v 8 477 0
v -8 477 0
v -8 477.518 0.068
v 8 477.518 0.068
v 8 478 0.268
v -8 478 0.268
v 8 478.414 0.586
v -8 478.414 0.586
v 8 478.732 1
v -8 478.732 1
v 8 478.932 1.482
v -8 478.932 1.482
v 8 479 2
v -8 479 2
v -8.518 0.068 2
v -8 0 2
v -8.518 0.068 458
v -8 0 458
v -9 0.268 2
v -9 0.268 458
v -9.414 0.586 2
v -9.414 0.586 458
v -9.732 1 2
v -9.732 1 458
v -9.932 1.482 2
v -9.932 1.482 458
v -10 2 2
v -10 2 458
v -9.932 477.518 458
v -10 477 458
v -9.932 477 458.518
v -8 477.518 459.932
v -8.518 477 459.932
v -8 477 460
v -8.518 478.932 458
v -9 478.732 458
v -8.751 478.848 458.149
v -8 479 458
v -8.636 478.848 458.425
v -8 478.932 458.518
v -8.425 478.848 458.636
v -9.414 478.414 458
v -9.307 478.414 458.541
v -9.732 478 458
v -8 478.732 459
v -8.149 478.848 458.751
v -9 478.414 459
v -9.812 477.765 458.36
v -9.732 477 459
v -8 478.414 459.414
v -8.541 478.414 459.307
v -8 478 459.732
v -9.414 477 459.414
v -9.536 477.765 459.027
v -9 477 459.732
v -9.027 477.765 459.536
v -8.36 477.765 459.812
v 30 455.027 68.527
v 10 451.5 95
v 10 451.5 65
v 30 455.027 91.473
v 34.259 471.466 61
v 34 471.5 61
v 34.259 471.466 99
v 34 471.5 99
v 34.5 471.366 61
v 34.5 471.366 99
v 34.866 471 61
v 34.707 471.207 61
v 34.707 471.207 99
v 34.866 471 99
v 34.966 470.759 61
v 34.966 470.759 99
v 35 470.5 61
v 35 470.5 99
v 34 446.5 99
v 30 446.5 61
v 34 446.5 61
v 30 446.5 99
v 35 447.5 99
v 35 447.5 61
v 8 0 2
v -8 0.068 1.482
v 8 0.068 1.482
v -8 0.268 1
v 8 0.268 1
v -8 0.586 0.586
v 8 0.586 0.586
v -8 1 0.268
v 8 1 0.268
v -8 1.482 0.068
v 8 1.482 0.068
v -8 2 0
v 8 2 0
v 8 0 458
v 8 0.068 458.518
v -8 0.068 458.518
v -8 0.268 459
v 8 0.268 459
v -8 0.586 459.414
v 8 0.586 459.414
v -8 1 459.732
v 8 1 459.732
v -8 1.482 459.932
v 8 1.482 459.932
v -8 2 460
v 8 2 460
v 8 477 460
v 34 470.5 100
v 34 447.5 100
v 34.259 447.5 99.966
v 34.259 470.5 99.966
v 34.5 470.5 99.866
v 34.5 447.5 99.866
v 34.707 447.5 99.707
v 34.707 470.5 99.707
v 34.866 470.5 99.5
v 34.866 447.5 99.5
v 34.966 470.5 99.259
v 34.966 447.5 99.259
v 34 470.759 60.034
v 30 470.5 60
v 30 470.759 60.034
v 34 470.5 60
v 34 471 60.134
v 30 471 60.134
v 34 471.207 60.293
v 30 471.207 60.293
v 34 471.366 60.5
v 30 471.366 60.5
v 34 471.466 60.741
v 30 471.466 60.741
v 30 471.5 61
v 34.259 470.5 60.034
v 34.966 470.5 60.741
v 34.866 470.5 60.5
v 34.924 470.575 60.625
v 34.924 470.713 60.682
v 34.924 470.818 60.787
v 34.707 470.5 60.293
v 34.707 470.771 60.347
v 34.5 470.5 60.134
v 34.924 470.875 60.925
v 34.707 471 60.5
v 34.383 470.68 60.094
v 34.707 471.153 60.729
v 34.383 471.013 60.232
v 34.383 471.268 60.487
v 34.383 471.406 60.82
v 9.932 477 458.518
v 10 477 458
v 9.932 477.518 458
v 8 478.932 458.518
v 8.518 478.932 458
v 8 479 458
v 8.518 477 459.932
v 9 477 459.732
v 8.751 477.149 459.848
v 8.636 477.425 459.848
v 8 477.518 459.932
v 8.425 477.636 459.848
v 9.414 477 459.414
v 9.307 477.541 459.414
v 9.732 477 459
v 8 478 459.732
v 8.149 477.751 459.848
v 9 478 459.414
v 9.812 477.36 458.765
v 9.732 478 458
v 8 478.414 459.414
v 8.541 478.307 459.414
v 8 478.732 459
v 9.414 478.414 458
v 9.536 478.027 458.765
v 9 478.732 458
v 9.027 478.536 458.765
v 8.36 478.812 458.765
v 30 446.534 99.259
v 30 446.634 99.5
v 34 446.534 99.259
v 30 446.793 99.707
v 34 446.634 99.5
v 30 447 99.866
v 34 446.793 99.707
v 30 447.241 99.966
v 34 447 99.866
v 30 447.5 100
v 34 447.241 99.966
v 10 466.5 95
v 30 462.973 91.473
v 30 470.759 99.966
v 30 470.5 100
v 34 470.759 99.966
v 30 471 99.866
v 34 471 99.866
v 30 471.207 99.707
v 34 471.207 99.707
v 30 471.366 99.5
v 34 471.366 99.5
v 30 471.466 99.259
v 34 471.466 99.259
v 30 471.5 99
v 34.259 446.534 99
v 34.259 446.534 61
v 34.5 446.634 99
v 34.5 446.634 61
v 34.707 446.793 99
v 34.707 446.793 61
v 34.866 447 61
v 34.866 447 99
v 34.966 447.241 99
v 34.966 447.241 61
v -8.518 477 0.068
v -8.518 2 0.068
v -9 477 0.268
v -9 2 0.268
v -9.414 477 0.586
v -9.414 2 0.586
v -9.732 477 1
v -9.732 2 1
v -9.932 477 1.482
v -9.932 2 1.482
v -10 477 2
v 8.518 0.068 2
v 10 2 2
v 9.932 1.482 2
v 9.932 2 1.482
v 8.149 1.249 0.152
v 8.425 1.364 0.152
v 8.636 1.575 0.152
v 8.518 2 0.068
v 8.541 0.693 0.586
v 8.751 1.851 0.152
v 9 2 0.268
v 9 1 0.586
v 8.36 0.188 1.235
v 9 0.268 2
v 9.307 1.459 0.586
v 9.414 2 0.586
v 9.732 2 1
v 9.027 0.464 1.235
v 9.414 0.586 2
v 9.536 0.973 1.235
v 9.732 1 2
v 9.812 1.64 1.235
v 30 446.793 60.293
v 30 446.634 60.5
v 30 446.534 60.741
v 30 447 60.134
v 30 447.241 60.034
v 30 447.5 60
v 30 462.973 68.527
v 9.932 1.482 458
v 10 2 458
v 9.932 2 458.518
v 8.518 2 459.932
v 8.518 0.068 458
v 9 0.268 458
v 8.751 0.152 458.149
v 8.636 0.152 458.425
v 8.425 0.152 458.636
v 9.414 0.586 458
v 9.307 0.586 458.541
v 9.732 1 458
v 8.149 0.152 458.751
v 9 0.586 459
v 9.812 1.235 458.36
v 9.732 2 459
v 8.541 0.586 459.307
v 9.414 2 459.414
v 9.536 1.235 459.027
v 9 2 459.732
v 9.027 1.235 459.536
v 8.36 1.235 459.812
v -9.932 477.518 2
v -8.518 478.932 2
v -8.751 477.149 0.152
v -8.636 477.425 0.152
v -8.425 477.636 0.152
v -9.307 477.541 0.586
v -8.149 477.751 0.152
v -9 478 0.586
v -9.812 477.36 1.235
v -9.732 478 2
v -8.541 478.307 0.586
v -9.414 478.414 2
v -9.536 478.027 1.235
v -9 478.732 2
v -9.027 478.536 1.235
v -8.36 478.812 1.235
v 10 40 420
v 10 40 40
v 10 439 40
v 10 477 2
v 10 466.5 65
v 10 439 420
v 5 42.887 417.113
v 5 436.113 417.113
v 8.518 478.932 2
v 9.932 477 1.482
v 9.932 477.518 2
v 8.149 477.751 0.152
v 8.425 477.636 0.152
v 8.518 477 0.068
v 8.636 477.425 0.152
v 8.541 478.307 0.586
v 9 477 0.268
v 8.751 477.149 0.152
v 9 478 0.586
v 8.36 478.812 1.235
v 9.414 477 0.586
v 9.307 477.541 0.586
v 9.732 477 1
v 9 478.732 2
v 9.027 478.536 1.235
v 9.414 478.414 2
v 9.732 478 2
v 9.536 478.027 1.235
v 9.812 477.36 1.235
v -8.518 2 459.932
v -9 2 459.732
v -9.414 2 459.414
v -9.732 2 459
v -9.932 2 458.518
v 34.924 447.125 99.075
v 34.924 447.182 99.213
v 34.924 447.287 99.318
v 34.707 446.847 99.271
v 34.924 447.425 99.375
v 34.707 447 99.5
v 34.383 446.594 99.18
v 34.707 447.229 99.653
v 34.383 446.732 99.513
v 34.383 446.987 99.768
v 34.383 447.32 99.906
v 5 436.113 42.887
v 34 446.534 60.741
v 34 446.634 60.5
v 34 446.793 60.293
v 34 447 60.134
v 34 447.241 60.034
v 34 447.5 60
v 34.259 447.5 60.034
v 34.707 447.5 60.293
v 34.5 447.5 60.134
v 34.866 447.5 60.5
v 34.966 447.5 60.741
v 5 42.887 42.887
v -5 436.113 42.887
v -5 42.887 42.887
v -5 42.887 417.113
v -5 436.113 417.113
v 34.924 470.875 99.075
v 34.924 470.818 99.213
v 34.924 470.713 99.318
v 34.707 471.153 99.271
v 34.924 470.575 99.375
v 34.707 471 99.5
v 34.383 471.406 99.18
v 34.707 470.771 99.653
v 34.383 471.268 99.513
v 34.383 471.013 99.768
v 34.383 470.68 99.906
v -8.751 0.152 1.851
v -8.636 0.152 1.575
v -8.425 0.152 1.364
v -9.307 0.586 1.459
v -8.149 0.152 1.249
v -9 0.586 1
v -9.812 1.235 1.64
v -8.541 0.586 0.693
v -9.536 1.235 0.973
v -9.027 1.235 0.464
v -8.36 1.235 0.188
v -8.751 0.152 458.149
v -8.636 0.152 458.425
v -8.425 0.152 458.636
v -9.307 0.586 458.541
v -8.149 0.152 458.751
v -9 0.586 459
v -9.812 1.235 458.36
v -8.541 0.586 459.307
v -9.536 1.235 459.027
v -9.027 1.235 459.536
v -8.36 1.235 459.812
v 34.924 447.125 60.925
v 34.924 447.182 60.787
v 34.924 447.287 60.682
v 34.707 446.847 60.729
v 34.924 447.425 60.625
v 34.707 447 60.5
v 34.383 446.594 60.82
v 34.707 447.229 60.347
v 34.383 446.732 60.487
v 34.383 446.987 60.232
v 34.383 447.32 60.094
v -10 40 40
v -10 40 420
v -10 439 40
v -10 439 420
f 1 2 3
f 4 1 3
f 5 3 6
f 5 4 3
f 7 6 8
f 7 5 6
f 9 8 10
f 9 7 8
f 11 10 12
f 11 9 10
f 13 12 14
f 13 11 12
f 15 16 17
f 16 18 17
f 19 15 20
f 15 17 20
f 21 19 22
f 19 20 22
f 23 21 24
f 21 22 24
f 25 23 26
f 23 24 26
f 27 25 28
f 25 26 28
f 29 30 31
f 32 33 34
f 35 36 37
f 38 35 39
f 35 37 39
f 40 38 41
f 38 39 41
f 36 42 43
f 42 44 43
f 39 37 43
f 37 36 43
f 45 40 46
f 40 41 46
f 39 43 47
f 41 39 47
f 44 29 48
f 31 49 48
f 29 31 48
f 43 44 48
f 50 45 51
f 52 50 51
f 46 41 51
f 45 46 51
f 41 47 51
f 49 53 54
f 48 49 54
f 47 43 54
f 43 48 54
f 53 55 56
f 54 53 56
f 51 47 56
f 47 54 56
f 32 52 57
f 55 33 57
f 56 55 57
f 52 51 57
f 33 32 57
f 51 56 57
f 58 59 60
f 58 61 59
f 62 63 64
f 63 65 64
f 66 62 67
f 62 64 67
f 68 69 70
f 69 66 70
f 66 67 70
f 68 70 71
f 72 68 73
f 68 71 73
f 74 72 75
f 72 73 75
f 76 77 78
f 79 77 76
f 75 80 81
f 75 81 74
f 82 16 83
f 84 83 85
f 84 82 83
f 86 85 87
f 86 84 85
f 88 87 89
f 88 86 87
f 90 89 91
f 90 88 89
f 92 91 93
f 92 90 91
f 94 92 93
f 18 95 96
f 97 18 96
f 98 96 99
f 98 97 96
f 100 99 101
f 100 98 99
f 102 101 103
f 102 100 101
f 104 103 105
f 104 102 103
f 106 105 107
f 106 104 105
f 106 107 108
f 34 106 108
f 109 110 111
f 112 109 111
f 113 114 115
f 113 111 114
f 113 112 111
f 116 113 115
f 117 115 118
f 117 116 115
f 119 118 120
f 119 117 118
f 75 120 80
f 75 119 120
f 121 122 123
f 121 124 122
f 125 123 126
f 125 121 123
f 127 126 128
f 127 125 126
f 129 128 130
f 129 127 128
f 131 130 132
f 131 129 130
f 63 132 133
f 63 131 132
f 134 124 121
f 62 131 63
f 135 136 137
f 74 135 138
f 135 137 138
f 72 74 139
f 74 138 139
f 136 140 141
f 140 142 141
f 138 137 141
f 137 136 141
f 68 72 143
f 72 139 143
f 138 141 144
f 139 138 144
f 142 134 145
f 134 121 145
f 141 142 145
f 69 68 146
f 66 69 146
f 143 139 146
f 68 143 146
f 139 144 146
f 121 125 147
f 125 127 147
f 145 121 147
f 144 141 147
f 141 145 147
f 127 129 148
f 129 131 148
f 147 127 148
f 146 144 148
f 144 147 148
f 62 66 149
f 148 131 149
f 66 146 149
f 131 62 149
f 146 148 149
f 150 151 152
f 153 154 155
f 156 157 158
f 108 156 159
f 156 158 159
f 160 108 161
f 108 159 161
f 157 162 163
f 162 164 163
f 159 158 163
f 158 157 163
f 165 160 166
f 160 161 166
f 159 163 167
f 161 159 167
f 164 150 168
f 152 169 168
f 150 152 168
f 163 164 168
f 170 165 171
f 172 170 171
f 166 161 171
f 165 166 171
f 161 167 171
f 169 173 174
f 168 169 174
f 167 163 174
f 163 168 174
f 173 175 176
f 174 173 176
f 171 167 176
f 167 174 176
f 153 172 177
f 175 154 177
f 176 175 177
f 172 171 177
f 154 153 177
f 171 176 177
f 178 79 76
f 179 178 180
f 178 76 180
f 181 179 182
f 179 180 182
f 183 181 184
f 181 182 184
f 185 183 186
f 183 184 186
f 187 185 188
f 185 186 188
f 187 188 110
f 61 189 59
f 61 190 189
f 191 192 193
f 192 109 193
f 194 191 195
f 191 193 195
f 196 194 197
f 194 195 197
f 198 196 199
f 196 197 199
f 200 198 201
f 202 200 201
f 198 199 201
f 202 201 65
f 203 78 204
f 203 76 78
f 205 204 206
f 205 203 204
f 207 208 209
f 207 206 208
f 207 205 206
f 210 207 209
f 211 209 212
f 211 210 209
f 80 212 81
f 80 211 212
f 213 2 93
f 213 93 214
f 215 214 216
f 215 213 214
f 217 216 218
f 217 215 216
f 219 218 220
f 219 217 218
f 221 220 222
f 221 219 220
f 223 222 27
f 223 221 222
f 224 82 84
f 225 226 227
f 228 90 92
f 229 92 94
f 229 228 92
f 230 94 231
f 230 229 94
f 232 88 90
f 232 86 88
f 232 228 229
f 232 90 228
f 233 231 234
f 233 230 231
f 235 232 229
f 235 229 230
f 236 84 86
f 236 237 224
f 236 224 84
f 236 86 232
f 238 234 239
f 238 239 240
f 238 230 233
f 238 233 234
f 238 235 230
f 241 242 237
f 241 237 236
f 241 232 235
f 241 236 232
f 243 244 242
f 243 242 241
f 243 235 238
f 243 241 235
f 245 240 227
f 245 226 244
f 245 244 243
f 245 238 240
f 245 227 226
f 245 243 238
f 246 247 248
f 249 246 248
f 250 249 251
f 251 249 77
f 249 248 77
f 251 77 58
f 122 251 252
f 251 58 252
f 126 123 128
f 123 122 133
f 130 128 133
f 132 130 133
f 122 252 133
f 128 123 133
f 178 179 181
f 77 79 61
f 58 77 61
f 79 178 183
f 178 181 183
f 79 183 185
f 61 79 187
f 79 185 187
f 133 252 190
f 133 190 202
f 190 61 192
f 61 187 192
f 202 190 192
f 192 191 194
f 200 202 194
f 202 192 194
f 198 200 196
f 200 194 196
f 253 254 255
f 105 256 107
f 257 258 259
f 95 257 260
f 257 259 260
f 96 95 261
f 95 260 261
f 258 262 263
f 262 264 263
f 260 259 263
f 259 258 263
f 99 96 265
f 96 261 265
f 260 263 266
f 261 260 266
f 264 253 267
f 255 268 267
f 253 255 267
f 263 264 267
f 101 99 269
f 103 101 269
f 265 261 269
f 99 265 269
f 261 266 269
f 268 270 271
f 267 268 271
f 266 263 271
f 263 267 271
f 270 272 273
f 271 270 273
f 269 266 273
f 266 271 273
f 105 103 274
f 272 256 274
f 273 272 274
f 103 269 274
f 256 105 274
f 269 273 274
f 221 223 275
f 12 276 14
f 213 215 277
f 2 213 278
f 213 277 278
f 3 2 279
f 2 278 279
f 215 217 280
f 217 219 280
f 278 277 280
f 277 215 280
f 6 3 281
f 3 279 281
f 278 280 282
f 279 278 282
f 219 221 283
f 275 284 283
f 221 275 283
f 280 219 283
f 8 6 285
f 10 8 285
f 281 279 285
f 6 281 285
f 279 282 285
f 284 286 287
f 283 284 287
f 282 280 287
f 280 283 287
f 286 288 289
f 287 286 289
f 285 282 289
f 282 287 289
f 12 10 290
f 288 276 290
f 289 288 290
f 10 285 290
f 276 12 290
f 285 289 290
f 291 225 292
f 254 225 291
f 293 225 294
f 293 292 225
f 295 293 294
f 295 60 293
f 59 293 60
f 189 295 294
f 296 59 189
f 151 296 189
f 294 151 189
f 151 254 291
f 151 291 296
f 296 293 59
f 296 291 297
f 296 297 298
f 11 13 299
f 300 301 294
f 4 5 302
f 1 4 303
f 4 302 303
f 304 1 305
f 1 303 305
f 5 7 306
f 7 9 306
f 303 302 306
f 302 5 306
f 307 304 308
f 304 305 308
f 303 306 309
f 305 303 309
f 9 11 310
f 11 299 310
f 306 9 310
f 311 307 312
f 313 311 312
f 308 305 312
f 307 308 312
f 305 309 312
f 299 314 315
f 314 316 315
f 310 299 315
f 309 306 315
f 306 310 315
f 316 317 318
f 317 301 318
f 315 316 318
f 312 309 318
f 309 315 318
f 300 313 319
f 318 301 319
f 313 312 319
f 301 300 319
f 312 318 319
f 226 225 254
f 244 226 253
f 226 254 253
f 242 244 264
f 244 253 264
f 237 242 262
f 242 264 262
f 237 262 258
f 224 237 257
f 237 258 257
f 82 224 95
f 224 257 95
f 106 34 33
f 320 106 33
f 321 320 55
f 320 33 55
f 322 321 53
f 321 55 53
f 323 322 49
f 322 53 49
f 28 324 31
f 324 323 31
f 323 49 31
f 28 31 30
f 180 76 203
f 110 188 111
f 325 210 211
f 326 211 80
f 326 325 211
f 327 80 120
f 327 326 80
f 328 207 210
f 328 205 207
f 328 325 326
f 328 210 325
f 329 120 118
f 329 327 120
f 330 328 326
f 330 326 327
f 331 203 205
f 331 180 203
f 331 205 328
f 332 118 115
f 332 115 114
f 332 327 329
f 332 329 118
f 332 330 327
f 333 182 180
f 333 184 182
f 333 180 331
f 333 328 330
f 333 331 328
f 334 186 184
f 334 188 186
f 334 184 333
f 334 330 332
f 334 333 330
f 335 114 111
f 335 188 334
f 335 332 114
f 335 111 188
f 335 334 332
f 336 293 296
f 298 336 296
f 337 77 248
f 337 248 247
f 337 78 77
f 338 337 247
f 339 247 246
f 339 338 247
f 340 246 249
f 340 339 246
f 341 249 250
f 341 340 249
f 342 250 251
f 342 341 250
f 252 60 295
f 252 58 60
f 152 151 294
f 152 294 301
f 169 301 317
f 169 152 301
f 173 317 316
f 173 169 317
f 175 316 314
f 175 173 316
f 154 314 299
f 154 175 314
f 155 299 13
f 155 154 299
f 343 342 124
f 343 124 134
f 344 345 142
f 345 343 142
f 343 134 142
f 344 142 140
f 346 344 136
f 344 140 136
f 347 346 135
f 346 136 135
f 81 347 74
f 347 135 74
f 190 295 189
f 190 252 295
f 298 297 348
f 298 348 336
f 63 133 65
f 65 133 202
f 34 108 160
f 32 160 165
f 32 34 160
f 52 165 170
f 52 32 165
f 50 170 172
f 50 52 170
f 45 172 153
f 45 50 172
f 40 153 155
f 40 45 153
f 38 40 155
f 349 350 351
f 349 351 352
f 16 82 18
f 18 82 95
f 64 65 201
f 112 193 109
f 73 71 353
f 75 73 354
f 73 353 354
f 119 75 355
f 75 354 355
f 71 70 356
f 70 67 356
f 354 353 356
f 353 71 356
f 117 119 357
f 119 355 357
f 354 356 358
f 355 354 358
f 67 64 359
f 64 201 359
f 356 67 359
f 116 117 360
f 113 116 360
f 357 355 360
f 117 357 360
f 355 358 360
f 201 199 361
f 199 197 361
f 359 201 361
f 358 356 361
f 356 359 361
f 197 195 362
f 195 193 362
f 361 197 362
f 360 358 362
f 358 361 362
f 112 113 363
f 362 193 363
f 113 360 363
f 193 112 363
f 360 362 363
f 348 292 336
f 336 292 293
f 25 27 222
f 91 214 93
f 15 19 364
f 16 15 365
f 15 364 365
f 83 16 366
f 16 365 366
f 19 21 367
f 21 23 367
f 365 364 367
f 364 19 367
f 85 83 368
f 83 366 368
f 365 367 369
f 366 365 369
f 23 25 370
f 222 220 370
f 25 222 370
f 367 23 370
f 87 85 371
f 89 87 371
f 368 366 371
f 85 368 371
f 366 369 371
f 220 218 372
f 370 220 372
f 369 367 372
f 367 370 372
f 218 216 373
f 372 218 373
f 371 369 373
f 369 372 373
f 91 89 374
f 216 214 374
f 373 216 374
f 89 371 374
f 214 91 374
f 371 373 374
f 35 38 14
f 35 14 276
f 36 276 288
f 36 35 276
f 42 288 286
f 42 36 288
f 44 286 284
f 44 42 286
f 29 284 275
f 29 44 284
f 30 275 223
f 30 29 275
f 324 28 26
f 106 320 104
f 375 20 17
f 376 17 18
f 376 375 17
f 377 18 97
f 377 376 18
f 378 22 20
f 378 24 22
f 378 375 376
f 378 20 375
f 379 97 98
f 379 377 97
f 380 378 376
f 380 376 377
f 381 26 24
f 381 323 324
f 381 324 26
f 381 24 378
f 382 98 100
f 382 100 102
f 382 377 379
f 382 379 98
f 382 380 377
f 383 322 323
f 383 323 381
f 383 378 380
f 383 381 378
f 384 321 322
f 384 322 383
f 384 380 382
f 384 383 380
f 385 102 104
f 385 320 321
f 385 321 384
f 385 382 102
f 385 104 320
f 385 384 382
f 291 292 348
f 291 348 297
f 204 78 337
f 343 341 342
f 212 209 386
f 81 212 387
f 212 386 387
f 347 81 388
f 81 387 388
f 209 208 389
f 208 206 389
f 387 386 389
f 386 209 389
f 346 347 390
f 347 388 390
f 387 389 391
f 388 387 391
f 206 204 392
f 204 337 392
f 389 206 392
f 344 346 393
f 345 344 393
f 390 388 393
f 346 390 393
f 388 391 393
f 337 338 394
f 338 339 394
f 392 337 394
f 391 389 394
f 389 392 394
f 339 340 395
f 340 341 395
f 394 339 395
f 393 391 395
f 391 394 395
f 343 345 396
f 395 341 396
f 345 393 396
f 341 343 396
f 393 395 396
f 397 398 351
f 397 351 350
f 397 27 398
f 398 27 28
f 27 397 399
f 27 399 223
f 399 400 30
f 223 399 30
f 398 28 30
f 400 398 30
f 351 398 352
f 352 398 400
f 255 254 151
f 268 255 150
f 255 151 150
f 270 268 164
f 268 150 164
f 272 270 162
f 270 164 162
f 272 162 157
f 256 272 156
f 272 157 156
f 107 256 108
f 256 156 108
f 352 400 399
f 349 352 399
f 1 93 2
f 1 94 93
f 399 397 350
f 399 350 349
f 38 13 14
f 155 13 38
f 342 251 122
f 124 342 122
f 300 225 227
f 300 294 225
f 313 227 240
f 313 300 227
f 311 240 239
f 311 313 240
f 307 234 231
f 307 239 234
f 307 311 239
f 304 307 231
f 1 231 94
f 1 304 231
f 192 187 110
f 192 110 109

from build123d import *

# Parameters (mm, degrees)
SKETCH1_W               = 479
SKETCH1_H               = 460
BOSS_EXTRUDE1_DEPTH     = 10
SKETCH2_W               = 399
SKETCH2_H               = 380
CUT_EXTRUDE1_DEPTH      = 5
CUT_EXTRUDE1_DRAFT      = -30
MIRROR1_COPY_1_SKETCH_W = 399
MIRROR1_COPY_1_SKETCH_H = 380
MIRROR1_COPY_1_DEPTH    = 5
MIRROR1_COPY_1_DRAFT    = -30
SKETCH3_W               = 15
SKETCH3_H               = 30
BOSS_EXTRUDE2_DEPTH     = 20
BOSS_EXTRUDE2_TAPER     = 10
SKETCH4_W               = 25
SKETCH4_H               = 40
BOSS_EXTRUDE3_DEPTH     = 5
FILLET3_R               = 2
FILLET4_R               = 1


with BuildPart() as part:
    # Sketch1 → Boss-Extrude1 (new, symmetric)
    with BuildSketch(Plane.YZ):
        with Locations((239.5, 230)):
            Rectangle(SKETCH1_W, SKETCH1_H)
    extrude(amount=BOSS_EXTRUDE1_DEPTH, both=True)


with BuildPart() as cut_extrude1_tool:
    # Sketch2 → Cut-Extrude1 (with draft: the straight prism first)
    with BuildSketch(Plane.YZ.offset(10)):
        with Locations((239.5, 230)):
            Rectangle(SKETCH2_W, SKETCH2_H)
    extrude(amount=-CUT_EXTRUDE1_DEPTH)
    # Cut-Extrude1: the draft: its side faces are tilted about the plane it starts from
    cut_extrude1_sides = [cut_extrude1_tool.faces().sort_by_distance(p)[0] for p in [
        (7.5, 40, 230),
        (7.5, 239.5, 40),
        (7.5, 439, 230),
        (7.5, 239.5, 420),
    ]]
    draft(cut_extrude1_sides, Plane.YZ.offset(10), CUT_EXTRUDE1_DRAFT)


with BuildPart() as part_1:
    add(part.part)

    # Cut-Extrude1: cut by cut_extrude1_tool
    add(cut_extrude1_tool.part, mode=Mode.SUBTRACT)


with BuildPart() as mirror1_copy_1_tool:
    # Mirror1 copy 1 sketch → Mirror1 copy 1 (with draft: the straight prism first)
    with BuildSketch(Plane(origin=(-10, 0, 0), x_dir=(0, 1, 0), z_dir=(-1, 0, 0))):
        with Locations((239.5, -230)):
            Rectangle(MIRROR1_COPY_1_SKETCH_W, MIRROR1_COPY_1_SKETCH_H)
    extrude(amount=-MIRROR1_COPY_1_DEPTH)
    # Mirror1 copy 1: the draft: its side faces are tilted about the plane it starts from
    mirror1_copy_1_sides = [mirror1_copy_1_tool.faces().sort_by_distance(p)[0] for p in [
        (-7.5, 40, 230),
        (-7.5, 239.5, 40),
        (-7.5, 439, 230),
        (-7.5, 239.5, 420),
    ]]
    draft(mirror1_copy_1_sides, Plane(origin=(-10, 0, 0), x_dir=(0, 1, 0), z_dir=(-1, 0, 0)), MIRROR1_COPY_1_DRAFT)


with BuildPart() as part_2:
    add(part_1.part)

    # Mirror1 copy 1: cut by mirror1_copy_1_tool
    add(mirror1_copy_1_tool.part, mode=Mode.SUBTRACT)

    # Sketch3 → Boss-Extrude2 (add)
    with BuildSketch(Plane.YZ.offset(10)):
        with Locations((459, 80)):
            Rectangle(SKETCH3_W, SKETCH3_H)
    extrude(amount=BOSS_EXTRUDE2_DEPTH, taper=BOSS_EXTRUDE2_TAPER)

    # Sketch4 → Boss-Extrude3 (add)
    with BuildSketch(Plane.YZ.offset(30)):
        with Locations((459, 80)):
            Rectangle(SKETCH4_W, SKETCH4_H)
    extrude(amount=BOSS_EXTRUDE3_DEPTH)

    # Fillet3
    fillet3_edges = [part_2.edges().sort_by_distance(p)[0] for p in [
        (10, 479, 230),
        (10, 239.5, 460),
        (10, 0, 230),
        (-10, 239.5, 460),
        (-10, 479, 230),
        (-10, 239.5, 0),
        (-10, 0, 230),
        (0, 0, 460),
        (0, 479, 460),
        (0, 479, 0),
        (0, 0, 0),
        (10, 239.5, 0),
    ]]
    fillet(fillet3_edges, radius=FILLET3_R)

    # Fillet4
    fillet4_edges = [part_2.edges().sort_by_distance(p)[0] for p in [
        (32.5, 446.5, 100),
        (32.5, 446.5, 60),
        (32.5, 471.5, 60),
        (32.5, 471.5, 100),
        (35, 446.5, 80),
        (35, 459, 60),
        (35, 471.5, 80),
        (35, 459, 100),
    ]]
    fillet(fillet4_edges, radius=FILLET4_R)


solid = part_2.part
